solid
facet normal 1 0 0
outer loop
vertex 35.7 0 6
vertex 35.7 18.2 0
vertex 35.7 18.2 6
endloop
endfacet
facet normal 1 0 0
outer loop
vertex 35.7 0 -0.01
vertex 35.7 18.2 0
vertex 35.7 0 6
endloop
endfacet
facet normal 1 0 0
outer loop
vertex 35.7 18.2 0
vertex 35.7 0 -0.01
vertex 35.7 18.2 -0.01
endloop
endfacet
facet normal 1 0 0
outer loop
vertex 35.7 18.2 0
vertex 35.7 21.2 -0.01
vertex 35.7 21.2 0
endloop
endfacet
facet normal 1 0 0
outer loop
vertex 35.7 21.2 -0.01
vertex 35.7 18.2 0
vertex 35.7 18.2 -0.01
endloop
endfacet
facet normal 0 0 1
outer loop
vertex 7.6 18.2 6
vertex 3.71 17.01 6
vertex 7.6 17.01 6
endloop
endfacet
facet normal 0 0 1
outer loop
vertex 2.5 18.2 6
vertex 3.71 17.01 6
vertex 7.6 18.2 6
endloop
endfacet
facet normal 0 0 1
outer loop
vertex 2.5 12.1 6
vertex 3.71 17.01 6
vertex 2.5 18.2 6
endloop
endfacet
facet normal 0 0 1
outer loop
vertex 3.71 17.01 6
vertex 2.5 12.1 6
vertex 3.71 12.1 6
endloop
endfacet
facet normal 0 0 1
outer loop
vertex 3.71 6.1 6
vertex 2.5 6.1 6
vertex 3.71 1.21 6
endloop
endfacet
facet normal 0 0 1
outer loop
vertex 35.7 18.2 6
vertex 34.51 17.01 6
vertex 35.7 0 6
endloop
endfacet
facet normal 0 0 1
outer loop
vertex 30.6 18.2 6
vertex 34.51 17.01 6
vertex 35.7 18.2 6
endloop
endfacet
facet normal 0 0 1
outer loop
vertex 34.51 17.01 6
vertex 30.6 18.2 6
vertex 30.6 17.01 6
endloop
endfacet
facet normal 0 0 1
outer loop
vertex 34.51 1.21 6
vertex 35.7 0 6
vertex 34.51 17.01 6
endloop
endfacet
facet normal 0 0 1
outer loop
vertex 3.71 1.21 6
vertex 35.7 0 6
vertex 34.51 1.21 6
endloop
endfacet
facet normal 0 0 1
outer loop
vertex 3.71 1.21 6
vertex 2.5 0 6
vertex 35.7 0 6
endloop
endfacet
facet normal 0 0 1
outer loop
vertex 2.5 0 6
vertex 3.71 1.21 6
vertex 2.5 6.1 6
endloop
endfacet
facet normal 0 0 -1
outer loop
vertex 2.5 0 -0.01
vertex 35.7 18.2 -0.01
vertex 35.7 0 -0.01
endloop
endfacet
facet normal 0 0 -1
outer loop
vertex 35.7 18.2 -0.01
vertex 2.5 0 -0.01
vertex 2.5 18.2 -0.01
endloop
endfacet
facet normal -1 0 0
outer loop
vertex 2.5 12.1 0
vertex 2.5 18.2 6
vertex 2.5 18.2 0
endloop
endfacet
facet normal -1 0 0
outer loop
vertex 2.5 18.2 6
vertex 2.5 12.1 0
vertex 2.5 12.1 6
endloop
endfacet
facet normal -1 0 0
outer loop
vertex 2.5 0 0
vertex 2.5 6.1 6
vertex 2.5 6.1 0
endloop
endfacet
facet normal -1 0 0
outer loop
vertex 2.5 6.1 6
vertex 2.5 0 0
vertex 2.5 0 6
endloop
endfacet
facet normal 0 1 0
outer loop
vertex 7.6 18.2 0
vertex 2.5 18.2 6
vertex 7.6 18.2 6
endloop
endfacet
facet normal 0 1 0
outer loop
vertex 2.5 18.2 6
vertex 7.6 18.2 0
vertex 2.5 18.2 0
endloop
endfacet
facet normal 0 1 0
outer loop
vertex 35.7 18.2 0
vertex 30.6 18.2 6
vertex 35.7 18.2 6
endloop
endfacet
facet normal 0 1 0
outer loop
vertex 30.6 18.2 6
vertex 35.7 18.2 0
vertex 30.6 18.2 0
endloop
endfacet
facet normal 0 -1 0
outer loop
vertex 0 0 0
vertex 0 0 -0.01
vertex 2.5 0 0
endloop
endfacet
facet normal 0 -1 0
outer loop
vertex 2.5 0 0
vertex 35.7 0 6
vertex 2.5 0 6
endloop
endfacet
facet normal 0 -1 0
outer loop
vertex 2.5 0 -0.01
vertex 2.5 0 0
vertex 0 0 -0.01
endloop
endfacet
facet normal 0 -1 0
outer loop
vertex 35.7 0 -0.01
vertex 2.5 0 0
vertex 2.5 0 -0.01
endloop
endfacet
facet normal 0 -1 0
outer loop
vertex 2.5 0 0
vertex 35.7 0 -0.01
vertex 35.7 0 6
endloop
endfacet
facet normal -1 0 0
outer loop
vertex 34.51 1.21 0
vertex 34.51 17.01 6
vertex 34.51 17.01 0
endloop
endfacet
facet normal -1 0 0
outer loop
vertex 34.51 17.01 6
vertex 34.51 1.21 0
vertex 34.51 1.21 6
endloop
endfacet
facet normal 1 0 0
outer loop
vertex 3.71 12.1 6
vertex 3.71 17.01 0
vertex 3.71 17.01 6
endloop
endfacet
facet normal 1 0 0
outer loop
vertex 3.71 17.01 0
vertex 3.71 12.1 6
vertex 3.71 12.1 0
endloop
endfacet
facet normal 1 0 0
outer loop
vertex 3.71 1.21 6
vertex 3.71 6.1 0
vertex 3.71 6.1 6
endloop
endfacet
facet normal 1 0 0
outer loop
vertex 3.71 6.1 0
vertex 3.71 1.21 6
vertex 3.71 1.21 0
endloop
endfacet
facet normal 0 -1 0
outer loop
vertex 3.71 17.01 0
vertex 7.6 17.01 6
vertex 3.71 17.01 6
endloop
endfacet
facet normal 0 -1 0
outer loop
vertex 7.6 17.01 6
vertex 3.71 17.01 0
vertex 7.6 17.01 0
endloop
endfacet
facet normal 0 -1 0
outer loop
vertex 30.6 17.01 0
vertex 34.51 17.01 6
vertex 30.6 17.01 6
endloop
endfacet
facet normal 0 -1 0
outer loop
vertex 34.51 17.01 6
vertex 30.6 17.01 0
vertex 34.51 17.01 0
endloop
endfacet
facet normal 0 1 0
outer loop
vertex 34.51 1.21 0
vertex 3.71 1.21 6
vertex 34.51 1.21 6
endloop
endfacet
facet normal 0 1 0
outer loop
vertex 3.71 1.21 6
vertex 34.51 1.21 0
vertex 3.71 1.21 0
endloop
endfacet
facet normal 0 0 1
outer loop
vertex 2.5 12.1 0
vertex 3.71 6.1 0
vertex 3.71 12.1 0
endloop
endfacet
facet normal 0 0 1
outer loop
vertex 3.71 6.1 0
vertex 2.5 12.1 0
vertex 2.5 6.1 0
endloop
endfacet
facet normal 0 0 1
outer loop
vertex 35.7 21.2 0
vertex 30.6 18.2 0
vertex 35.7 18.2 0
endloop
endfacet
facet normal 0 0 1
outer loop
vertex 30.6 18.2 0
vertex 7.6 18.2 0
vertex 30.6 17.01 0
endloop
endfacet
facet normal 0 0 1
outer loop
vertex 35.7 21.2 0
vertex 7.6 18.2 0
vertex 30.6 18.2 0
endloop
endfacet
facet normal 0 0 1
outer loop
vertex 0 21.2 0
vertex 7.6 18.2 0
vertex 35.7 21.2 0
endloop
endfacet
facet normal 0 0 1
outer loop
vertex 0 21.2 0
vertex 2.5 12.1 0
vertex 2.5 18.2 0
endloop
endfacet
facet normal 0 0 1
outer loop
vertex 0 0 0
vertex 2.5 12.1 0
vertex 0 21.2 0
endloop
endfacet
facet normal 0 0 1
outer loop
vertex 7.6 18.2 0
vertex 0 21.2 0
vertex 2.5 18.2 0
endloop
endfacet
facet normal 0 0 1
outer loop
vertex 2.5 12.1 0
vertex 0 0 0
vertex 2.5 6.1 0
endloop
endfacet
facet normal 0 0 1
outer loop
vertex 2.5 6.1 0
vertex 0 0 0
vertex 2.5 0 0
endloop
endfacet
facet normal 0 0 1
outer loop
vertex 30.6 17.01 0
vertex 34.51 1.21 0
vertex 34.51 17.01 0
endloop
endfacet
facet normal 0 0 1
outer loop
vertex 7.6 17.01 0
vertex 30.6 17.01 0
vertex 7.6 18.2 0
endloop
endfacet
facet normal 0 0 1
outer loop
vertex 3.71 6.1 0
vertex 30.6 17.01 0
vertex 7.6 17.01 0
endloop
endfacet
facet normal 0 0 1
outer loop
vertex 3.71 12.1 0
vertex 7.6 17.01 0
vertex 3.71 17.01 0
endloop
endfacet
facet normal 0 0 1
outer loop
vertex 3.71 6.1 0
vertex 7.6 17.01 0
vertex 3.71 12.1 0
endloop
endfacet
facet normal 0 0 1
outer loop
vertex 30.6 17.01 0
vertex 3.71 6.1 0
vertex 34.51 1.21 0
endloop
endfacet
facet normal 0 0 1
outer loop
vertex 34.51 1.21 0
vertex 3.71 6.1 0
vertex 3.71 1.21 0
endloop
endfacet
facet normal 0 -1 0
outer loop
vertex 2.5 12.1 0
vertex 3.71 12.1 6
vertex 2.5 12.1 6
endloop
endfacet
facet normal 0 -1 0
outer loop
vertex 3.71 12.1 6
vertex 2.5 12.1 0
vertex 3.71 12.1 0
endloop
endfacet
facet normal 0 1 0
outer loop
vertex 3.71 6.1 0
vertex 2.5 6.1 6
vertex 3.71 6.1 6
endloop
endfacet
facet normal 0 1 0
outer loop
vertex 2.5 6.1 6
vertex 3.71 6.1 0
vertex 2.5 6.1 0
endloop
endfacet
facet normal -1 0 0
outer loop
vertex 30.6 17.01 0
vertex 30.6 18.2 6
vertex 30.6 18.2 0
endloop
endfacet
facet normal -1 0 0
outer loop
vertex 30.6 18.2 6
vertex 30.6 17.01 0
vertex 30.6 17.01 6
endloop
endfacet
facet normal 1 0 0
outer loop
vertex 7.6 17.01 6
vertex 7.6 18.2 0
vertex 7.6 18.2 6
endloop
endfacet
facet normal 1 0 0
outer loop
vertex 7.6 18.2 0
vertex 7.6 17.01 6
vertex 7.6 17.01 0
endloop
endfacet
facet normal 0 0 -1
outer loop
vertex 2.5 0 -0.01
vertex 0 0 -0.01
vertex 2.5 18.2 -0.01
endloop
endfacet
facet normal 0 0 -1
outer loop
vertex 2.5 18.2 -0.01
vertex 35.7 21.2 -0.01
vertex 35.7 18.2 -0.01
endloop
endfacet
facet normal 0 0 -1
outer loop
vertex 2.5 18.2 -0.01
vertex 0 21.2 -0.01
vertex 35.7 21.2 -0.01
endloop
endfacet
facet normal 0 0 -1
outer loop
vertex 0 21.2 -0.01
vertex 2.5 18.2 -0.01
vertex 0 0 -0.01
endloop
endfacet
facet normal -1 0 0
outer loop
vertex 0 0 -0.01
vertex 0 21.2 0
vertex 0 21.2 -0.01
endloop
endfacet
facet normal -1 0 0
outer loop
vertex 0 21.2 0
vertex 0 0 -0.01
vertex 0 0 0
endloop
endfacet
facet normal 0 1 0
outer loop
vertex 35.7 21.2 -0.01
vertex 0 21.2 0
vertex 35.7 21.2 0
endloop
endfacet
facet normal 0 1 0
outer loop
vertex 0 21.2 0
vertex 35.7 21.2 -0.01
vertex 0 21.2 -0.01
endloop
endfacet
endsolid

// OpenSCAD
// file: ../Base/Boxes.scad
// Fischertechnik Box Foundation
// Pre-designed Boxes

use <Constants.scad>

include <PlacementOptions.scad>

box190Width = 190;
box190Depth = 130;
box130Width = 130;
box130Depth = 95;

// Values are from an original ec3 box
topBottomDifference = 1.5;
outerHeight = 40;
baseThickness = 1.8;
innerHeight = outerHeight - baseThickness;
stackExcess = 5.7;
radius = 3.5;
wallThickness = 1.5;
tolerance = 0.2;

boxWallThickness = wallThickness;
boxBaseThickness = baseThickness;
boxWebWidth = 3.0;

// getBoxWallThickness()
// Gets the wall thickness of a Fischertechnik Box
function getBoxWallThickness() = boxWallThickness;

// getBoxUsageHeight(height = 38.2)
// Gets the usable height of a Fischertechnik box
// height = Outer height of the box from the bottom to the upper edge.
function getBoxUsageHeight(height = outerHeight) = height - baseThickness - stackExcess;

// getBoxInnerHeight()
// Gets the inner height of a Fischertechnik box, including the stack excess
function getBoxInnerHeight() = innerHeight;

// getBoxBaseThickness()
// Gets the thickness of the Fischertechnik box base.
function getBoxBaseThickness() = boxBaseThickness;

// getBoxWebWidth()
// Gets the width of a box web
function getBoxWebWidth() = boxWebWidth;

// getBox190Space()
// Gets the usable inner space of a Box 190 as an x/y-list
function getBox190Space() = [
    box190Width - 2*getBoxWallThickness() - topBottomDifference, 
    box190Depth - 2*getBoxWallThickness() - topBottomDifference ];

// RoundedCornerPlate(width, depth, height, radius)
// Creates a body plate with rounded corners for a box. Used
// also to create the complete box with the hull module.
// width = Width of the plate
// depth = depth of the plate 
// height = thickness of the plate
// radius = radius of the rounded corner
module RoundedCornerPlate(width, depth, height, radius) {
    translate([radius, radius])
    hull() {
        w = width-2*radius;
        d = depth-2*radius;
        cube([w, d, height]);
        cylinder(height, r=radius, $fn=getFragments());
        translate([w, 0])
            cylinder(height, r=radius, $fn=getFragments());
        translate([w, d])
            cylinder(height, r=radius, $fn=getFragments());
        translate([0, d])
            cylinder(height, r=radius, $fn=getFragments());
    }
}

// BoxBase(width, depth)
// Creates an empty stackable Fischertechnik compatible box
// width = Outer width of the box (190, 130, ...)
// depth = Outer depth of the box (130, 95, ...)

module BoxBase(width, depth, height=outerHeight) {    
    thinPlate = 0.01;

    innerHeight = height - baseThickness;    
    
    module Body(tolerance=tolerance) {
        hull() {
            // Bottom with tolerance to fit into the original boxes when stacked
            translate([-wallThickness+tolerance, -wallThickness+tolerance, -baseThickness])
                RoundedCornerPlate(width-topBottomDifference-2*tolerance, depth-topBottomDifference-2*tolerance, thinPlate, radius);
            
            // Top
            translate([-wallThickness-topBottomDifference/2, -wallThickness-topBottomDifference/2, innerHeight-thinPlate])
                RoundedCornerPlate(width, depth, thinPlate, radius);
         }
    }

    module Cutoff() {
        hull() {
            coWidth = width - 2*wallThickness;
            coDepth = depth - 2*wallThickness;
            
            // Bottom
            RoundedCornerPlate(coWidth-topBottomDifference, coDepth-topBottomDifference, thinPlate, radius);

            // Top
            translate([-topBottomDifference/2, -topBottomDifference/2, innerHeight+thinPlate]) 
                RoundedCornerPlate(coWidth, coDepth, thinPlate, radius);
        }
    }
    
    difference() {        
        Body();
        Cutoff();
        stackOffset = innerHeight - stackExcess;
        translate([0, 0, stackOffset + baseThickness])
            Body(tolerance=0);
    }
}

// Creates the Fischertechnik empty box 130x190 mm and places it at position 0,0
// 190x130 are the outer sizes, the inner space is slightly smaller. Use getBox190Space() to get the inner sizes.
// The box is positioned that the usable inner space is at the 0,0,0 position.

module Box190() {
    BoxBase(box190Width, box190Depth);
}

// Gets the usable inner space of a Box 130 as an x/y-list
function getBox130Space() = [
    box130Width - 2*getBoxWallThickness() - topBottomDifference, 
    box130Depth - 2*getBoxWallThickness() - topBottomDifference ];

// Creates the Fischertechnik empty box 95x130 mm and places it at position 0,0
// 190x130 are the outer sizes, the inner space is slightly smaller. Use getBox190Space() to get the inner sizes.
// The box is positioned that the usable inner space is at the 0,0,0 position.

module Box130() {
    BoxBase(box130Width, box130Depth);
}

// Creates a web at the specified box walls
// corner 0 = LowerLeft, 1 = UpperLeft, 2 = UpperRight, 3 = LowerRight
// side 0 = LeftOfCorner, 1 = RightOfCorner
// distance = Distance in mm from the corner
// boxSpace = inner width and depth of the box (default: Box 190)
// webWidth = length of the web (default is 3 mms)
// webThickness = thickness of the web (default is 1 mm)
// height = Height of the web (standard is getBoxUsageHeight())
// sink = How much of the web is sunk into the wall

module BoxWeb(
    corner, 
    side, 
    distance, 
    boxSpace=getBox190Space(), 
    webWidth=getBoxWebWidth(), 
    webThickness=1.0, 
    height=getBoxUsageHeight(),
    sink = getBoxWallThickness()/2) {
    width = (corner % 2 == 0) ? 
            (side == LeftOfCorner ? webWidth : webThickness) :
            (side == LeftOfCorner ? webThickness : webWidth);

    depth = (corner % 2 == 0) ? 
            (side == RightOfCorner ? webWidth : webThickness) :
            (side == RightOfCorner ? webThickness : webWidth);
    
    xDiff = corner == LowerLeft ? 
                (side == LeftOfCorner ? -sink : distance) :
            (corner == UpperLeft ?                
                (side == LeftOfCorner ? distance : -sink) :
            (corner == UpperRight ?
                (side == LeftOfCorner ? boxSpace.x-webWidth+sink : boxSpace.x-distance-webThickness) :
                (side == LeftOfCorner ? boxSpace.x-distance-webThickness: boxSpace.x-webWidth+sink)));

    yDiff = corner == LowerLeft ? 
                (side == RightOfCorner ? -sink : distance) :
            (corner == UpperLeft ?
                (side == RightOfCorner ? boxSpace.y-distance-webThickness : boxSpace.y-webWidth+sink) :
            (corner == UpperRight ?
                (side == RightOfCorner ? boxSpace.y-webWidth+sink : boxSpace.y-distance-webThickness) :
                (side == RightOfCorner ? distance : -sink)));
    
    translate([xDiff, yDiff, -getExcess()])
        cube([width, depth, height + 2*getExcess()]);
}
// file: ../Base/Rotation.scad
// Fischertechnik Box Foundation
// Geometry Helpers Rotation

include <PlacementOptions.scad>

// getRotatedSpace(space, rotation=NoRotation)
// Rotates the space dependent on the specified rotation

function getRotatedSpace(space, rotation=NoRotation) = [
    (rotation == Rotate90 || rotation == Rotate270) ? space.y : space.x,
    (rotation == Rotate90 || rotation == Rotate270) ? space.x : space.y
];

// Rotates the given space around the fixed left lower corner
// space = the space the children needs as width/depth list [width,depth]
// rotation = 0 Rotate0 degrees, 1 Rotate90 degrees, 2 Rotate180 degrees, 3 Rotate270 degrees (equivalent to -90)

module RotateFix(space, rotation=NoRotation) {
    dy = (rotation == Rotate0 || rotation == Rotate270) ? 0 :
        (rotation == Rotate90) ? space.x :
        space.y;
    dx = (rotation < Rotate180) ? 0 :
        (rotation == Rotate180) ? space.x :
        space.y;
    
    translate([dx, dy, 0])
        rotate([0, 0, rotations[rotation]])
            children();
}
// file: ../Base/Alignment.scad
// Fischertechnik Box Foundation
// Geometry Helpers Alignment

include <PlacementOptions.scad>

// getAlignedX(elementWidth, spaceWidth, align=AlignRight, offset=0)
// Gets the aligned X offset of an element with the given
// width in the given space.
// elementWidth = The width of the element to positon
// spaceWidth = The space where the element should be aligned
// align = 0 AlignLeft, 1 AlignCenter, 2 AlignRight
// offset = an optional offset from the aligned position. When
// aligned left or centered, then positive values are in X direction.
// When aligned right then positive values are in negative X direction.

function getAlignedX(elementWidth, spaceWidth, align=AlignRight, offset=0) =
    (align == AlignLeft) ?
        offset :
        ((align == AlignCenter) ?
        (spaceWidth - elementWidth)/2 + offset :
        spaceWidth - offset - elementWidth);

// getAlignedY(elementDepth, spaceDepth, align=AlignTop, offset=0)
// Gets the aligned Y offset of an element with the given
// depth in the given space.
// elementDepth = The depth of the element to positon
// spaceDepth = The space where the element should be aligned
// align = 0 AlignBottom, 1 AlignCenter, 2 AlignTop
// offset = an optional offset from the aligned position. When
// aligned bottom or centered, then positive values are in Y direction.
// When aligned top then positive values are in negative Y direction.

function getAlignedY(elementDepth, spaceDepth, align=AlignTop, offset=0) =
    (align == AlignBottom) ?
        offset :
        ((align == AlignCenter) ?
        (spaceDepth - elementDepth)/2 + offset :
        spaceDepth - offset - elementDepth);
// file: ../Base/PlacementOptions.scad
// Fischertechnik Box Foundation
// Placement Options

// Alignment
NoAlign = 0;
AlignLeft = 1;
AlignBottom = 2;
AlignCenter = 3;
AlignRight = 4;
AlignTop = 5;

// Element rotation degree steps
rotations = [0, -90, -180, -270];

// Rotation
NoRotation = 0;
Rotate0 = 0;
Rotate90 = 1;
Rotate180 = 2;
Rotate270 = 3;

// Docking (seen from above)
NoDock = -1;
DockLeft = 0;
DockTop = 1;
DockRight = 2;
DockCorner = 2;
DockBottom = 3;

// Web corners
LowerLeft = 0;
UpperLeft = 1;
UpperRight = 2;
LowerRight = 3;

// Web position relative to corner
LeftOfCorner = 0;
RightOfCorner = 1;

// Rails direction
Horizontal = true;
Vertical = false;
// file: ../Base/Placement.scad
// Fischertechnik Box Foundation
// Geometry Helpers Placement

use <Constants.scad>
use <Alignment.scad>
use <Rotation.scad>
use <Boxes.scad>

include <PlacementOptions.scad>

// Place(x=0, y=0, elementSpace=[0,0], alignX=AlignLeft, alignY=AlignBottom, rotation=Rotate0, boxSpace=getBox190Space())
// Places the child at the specified position
// y = Y-Position. This is a relative position when an X aligment is specified.
// x = X-Position. This is a relative position when an Y aligment is specified.
// elementSpace = space of the element to be placed [x,y]
// alignX = -1=NoAlign, 0 AlignLeft, 1 AlignCenter, 3 AlignRight (elementSpace and boxSpace required!)
// alignY = -1=NoAlign, 2 AlignBottom, 1 AlignCenter, 4 AlignTop (elementSpace and boxSpace required!)
// rotation = 0 Rotate0 0 degrees, 1 Rotate90 90 degrees, 
// 2 Rotate180 180 degrees, 3 Rotate270 270 degrees (equivalent to -90)
// boxSpace = Inner space of the box where the placement occurs [x,y] - default is Box 190x130 inner space

module Place(x=0, y=0, elementSpace=[0,0], 
  alignX=AlignLeft, alignY=AlignBottom, 
  rotation=NoRotation, boxSpace=getBox190Space()) {

    module Position(x, y, space, rotation=Rotate0) {
        translate([x, y, 0])
            RotateFix(space, rotation)
                children();
    }

    space = getRotatedSpace(elementSpace, rotation);
    alignedX = getAlignedX(space.x, boxSpace.x, alignX, x);
    alignedY = getAlignedY(space.y, boxSpace.y, alignY, y);
    Position(alignedX, alignedY, elementSpace, rotation)
        children();
}

// Center(space=getBox130Space(), elementSpace=[0,0])
// space = Space where the children is centered. For cylinder use centered=true and no elementSpace.
// elementSpace = space of the element to be centered [x,y]

module Center(space=getBox190Space(), elementSpace=[0,0]) {
    Place(elementSpace=elementSpace, boxSpace=space, alignX=AlignCenter, alignY=AlignCenter)
        children();
}

// CenterHorizontal(width=0, y=0, offset=0, space=getBox130Space())
// width = Width of the element to be placed.
// y = Y position of the element
// offset = Offset from the center position (negative will be left of the center)
// space = Space where the element is placed

module CenterHorizontal(width=0, y=0, offset=0, space=getBox190Space()) {
    Place(x=offset, y=y, elementSpace=[width, 0], boxSpace=space, alignX=AlignCenter)
        children(0);
}

// CenterVertical(depth=0, x=0, offset=0, space=getBox130Space())
// depth = Depth of the element to be placed.
// x = X position of the element
// offset = Offset from the center position (negative will be down of the center)
// space = Space where the element is placed

module CenterVertical(depth=0, x=0, offset=0, space=getBox190Space()) {
    Place(x=x, y=offset, elementSpace=[0, depth], boxSpace=space, alignY=AlignCenter)
        children(0);
}

// getIsVertical(align)
// True if the specified alignment needs a vertical orientation for a divider (AlignRight, AlignLeft)

function getIsVertical(align) = (align == AlignRight || align == AlignLeft);

// getIsHorizontal(align)
// True if the specified alignment needs a horizontal orientation for a divider (AlignTop, AlignBottom)

function getIsHorizontal(align) = (align == AlignTop || align == AlignBottom);
// file: ../Base/Constants.scad
// Fischertechnik Box Foundation
// Constants

// Constant values necessary for multiple elements

// Base constants
dividerThickness = 1.2;
excess = 0.01;
fragments = 90;
tolerance = 0.8;

// Gets the thickness of a divider 
function getDividerThickness() = dividerThickness;

// Gets the excess that is used to merge walls into each other
function getExcess() = excess;

// Gets amount of fragments of a cylinder
function getFragments() = fragments;

// Gets the inner tolerance of a frame to each side
function getTolerance() = tolerance;


// Fischertechnik specific constants
axisDiameter = 4;
axisBottomDiameter = axisDiameter + 1;
axisTolerance = 0.2;
axisLockingLength = 8;

// Gets axis diameter of Fischertechnik axis
function getAxisDiameter() = axisDiameter;

// Gets axis diameter tolerance (subtracted for element axis)
function getAxisTolerance() = axisTolerance;

// Gets the axis diameter for standing axis
function getStandAxisDiameter() = getAxisDiameter() - getAxisTolerance();

// Gets axis bottom diameter for thicker part at the bottom
function getAxisBottomDiameter() = axisBottomDiameter;

// Gets the lengthh of the locking part of a locking axis
function getAxisLockingLength() = axisLockingLength;

// Studs

studHeight = 2.5;
studTolerance = 0.2;

// gets the height of a connecting stud
function getStudHeight() = studHeight;

// gets the connecting stud height tolerance
function getStudTolerance() = studTolerance;

// Dockable Frame with Edge

standardEdgeDistance = 2.5;
standardWebDistance = 11.5;
standardCornerLength = 15;

// gets the standard distance to the wall of the box for dockable frames with webs
function getStandardEdgeDistance() = standardEdgeDistance;

// gets the standard distance of each web to the corner of the dockable frame
function getStandardWebDistance() = standardWebDistance;

// gets the standard length of the corner walls of a dockable frame
function getStandardCornerLength() = standardCornerLength;

// Tubes

tubeWallFactor = 0.8;

// gets the wall thickness of a tube.
function getTubeWallThickness() = tubeWallFactor * getDividerThickness();

// Small Parts and Divider Frame

smallPartsFrameHeight = 20;

// gets the frame height for docked small parts boxes.
function getSmallPartsFrameHeight() = smallPartsFrameHeight;

// Hubs

hubRingDiameter = 19.5;
hubRingLevelDiameter = 21;

// gets the diameter of a tube matching the inner ring of a wheel
function getHubRingDiameter() = hubRingDiameter;

// gets the diameter of a hub tube with a thicker diameter
function getHubRingLevelDiameter() = hubRingLevelDiameter;

// Struts

strutAddLength = 9.0;
strutDepth = 8.0;

// gets the full length of a strut
function getFullStrutLength(length) = length + strutAddLength;

// gets the radius of the end of a strut
function getStrutEndRadius() = strutAddLength / 2;

// gets the the depth of a strut
function getStrutDepth() = strutDepth;
// main file
// Fischertechnik Box Library
// Frame for U form gearbox
// 31068, 31078

use <../Base/Constants.scad>
use <../Base/Placement.scad>
use <../ModelBase/Simple.scad>

include <../Base/PlacementOptions.scad>

/* [Hidden] */
width = 30;
depth = 15;
height = 6;
gearDepth = 3;

volume = [width, depth, height];

// getFrameUFormGearboxSpace()
// Gets the space for a U form gearbox including the stud and gear extension

function getFrameUFormGearboxSpace() = getFrameOuterVolume([width + getStudHeight(), depth + gearDepth, height]);

// FrameUFormGearbox()
// Frame for U form gearbox

module FrameUFormGearbox() {
    Space(getFrameUFormGearboxSpace());
    translate([getStudHeight(), 0]) {
        difference() {
            Frame([width, depth, height]);
            studCutoff = 6;            
            translate([-getDividerThickness()/2, (getFrameOuterVolume(volume).y - studCutoff)/2])
                cube([2*getDividerThickness(), studCutoff, height + getExcess()]);
            gearCutoff = studCutoff + width/2 + 2;
            translate([(getFrameOuterVolume(volume).x - gearCutoff)/2, getFrameOuterVolume(volume).y - 1.5*getDividerThickness(), ])
                cube([gearCutoff, 2*getDividerThickness(), height + getExcess()]);
        }
    }
}

// test
color("lightgray")
FrameUFormGearbox();
